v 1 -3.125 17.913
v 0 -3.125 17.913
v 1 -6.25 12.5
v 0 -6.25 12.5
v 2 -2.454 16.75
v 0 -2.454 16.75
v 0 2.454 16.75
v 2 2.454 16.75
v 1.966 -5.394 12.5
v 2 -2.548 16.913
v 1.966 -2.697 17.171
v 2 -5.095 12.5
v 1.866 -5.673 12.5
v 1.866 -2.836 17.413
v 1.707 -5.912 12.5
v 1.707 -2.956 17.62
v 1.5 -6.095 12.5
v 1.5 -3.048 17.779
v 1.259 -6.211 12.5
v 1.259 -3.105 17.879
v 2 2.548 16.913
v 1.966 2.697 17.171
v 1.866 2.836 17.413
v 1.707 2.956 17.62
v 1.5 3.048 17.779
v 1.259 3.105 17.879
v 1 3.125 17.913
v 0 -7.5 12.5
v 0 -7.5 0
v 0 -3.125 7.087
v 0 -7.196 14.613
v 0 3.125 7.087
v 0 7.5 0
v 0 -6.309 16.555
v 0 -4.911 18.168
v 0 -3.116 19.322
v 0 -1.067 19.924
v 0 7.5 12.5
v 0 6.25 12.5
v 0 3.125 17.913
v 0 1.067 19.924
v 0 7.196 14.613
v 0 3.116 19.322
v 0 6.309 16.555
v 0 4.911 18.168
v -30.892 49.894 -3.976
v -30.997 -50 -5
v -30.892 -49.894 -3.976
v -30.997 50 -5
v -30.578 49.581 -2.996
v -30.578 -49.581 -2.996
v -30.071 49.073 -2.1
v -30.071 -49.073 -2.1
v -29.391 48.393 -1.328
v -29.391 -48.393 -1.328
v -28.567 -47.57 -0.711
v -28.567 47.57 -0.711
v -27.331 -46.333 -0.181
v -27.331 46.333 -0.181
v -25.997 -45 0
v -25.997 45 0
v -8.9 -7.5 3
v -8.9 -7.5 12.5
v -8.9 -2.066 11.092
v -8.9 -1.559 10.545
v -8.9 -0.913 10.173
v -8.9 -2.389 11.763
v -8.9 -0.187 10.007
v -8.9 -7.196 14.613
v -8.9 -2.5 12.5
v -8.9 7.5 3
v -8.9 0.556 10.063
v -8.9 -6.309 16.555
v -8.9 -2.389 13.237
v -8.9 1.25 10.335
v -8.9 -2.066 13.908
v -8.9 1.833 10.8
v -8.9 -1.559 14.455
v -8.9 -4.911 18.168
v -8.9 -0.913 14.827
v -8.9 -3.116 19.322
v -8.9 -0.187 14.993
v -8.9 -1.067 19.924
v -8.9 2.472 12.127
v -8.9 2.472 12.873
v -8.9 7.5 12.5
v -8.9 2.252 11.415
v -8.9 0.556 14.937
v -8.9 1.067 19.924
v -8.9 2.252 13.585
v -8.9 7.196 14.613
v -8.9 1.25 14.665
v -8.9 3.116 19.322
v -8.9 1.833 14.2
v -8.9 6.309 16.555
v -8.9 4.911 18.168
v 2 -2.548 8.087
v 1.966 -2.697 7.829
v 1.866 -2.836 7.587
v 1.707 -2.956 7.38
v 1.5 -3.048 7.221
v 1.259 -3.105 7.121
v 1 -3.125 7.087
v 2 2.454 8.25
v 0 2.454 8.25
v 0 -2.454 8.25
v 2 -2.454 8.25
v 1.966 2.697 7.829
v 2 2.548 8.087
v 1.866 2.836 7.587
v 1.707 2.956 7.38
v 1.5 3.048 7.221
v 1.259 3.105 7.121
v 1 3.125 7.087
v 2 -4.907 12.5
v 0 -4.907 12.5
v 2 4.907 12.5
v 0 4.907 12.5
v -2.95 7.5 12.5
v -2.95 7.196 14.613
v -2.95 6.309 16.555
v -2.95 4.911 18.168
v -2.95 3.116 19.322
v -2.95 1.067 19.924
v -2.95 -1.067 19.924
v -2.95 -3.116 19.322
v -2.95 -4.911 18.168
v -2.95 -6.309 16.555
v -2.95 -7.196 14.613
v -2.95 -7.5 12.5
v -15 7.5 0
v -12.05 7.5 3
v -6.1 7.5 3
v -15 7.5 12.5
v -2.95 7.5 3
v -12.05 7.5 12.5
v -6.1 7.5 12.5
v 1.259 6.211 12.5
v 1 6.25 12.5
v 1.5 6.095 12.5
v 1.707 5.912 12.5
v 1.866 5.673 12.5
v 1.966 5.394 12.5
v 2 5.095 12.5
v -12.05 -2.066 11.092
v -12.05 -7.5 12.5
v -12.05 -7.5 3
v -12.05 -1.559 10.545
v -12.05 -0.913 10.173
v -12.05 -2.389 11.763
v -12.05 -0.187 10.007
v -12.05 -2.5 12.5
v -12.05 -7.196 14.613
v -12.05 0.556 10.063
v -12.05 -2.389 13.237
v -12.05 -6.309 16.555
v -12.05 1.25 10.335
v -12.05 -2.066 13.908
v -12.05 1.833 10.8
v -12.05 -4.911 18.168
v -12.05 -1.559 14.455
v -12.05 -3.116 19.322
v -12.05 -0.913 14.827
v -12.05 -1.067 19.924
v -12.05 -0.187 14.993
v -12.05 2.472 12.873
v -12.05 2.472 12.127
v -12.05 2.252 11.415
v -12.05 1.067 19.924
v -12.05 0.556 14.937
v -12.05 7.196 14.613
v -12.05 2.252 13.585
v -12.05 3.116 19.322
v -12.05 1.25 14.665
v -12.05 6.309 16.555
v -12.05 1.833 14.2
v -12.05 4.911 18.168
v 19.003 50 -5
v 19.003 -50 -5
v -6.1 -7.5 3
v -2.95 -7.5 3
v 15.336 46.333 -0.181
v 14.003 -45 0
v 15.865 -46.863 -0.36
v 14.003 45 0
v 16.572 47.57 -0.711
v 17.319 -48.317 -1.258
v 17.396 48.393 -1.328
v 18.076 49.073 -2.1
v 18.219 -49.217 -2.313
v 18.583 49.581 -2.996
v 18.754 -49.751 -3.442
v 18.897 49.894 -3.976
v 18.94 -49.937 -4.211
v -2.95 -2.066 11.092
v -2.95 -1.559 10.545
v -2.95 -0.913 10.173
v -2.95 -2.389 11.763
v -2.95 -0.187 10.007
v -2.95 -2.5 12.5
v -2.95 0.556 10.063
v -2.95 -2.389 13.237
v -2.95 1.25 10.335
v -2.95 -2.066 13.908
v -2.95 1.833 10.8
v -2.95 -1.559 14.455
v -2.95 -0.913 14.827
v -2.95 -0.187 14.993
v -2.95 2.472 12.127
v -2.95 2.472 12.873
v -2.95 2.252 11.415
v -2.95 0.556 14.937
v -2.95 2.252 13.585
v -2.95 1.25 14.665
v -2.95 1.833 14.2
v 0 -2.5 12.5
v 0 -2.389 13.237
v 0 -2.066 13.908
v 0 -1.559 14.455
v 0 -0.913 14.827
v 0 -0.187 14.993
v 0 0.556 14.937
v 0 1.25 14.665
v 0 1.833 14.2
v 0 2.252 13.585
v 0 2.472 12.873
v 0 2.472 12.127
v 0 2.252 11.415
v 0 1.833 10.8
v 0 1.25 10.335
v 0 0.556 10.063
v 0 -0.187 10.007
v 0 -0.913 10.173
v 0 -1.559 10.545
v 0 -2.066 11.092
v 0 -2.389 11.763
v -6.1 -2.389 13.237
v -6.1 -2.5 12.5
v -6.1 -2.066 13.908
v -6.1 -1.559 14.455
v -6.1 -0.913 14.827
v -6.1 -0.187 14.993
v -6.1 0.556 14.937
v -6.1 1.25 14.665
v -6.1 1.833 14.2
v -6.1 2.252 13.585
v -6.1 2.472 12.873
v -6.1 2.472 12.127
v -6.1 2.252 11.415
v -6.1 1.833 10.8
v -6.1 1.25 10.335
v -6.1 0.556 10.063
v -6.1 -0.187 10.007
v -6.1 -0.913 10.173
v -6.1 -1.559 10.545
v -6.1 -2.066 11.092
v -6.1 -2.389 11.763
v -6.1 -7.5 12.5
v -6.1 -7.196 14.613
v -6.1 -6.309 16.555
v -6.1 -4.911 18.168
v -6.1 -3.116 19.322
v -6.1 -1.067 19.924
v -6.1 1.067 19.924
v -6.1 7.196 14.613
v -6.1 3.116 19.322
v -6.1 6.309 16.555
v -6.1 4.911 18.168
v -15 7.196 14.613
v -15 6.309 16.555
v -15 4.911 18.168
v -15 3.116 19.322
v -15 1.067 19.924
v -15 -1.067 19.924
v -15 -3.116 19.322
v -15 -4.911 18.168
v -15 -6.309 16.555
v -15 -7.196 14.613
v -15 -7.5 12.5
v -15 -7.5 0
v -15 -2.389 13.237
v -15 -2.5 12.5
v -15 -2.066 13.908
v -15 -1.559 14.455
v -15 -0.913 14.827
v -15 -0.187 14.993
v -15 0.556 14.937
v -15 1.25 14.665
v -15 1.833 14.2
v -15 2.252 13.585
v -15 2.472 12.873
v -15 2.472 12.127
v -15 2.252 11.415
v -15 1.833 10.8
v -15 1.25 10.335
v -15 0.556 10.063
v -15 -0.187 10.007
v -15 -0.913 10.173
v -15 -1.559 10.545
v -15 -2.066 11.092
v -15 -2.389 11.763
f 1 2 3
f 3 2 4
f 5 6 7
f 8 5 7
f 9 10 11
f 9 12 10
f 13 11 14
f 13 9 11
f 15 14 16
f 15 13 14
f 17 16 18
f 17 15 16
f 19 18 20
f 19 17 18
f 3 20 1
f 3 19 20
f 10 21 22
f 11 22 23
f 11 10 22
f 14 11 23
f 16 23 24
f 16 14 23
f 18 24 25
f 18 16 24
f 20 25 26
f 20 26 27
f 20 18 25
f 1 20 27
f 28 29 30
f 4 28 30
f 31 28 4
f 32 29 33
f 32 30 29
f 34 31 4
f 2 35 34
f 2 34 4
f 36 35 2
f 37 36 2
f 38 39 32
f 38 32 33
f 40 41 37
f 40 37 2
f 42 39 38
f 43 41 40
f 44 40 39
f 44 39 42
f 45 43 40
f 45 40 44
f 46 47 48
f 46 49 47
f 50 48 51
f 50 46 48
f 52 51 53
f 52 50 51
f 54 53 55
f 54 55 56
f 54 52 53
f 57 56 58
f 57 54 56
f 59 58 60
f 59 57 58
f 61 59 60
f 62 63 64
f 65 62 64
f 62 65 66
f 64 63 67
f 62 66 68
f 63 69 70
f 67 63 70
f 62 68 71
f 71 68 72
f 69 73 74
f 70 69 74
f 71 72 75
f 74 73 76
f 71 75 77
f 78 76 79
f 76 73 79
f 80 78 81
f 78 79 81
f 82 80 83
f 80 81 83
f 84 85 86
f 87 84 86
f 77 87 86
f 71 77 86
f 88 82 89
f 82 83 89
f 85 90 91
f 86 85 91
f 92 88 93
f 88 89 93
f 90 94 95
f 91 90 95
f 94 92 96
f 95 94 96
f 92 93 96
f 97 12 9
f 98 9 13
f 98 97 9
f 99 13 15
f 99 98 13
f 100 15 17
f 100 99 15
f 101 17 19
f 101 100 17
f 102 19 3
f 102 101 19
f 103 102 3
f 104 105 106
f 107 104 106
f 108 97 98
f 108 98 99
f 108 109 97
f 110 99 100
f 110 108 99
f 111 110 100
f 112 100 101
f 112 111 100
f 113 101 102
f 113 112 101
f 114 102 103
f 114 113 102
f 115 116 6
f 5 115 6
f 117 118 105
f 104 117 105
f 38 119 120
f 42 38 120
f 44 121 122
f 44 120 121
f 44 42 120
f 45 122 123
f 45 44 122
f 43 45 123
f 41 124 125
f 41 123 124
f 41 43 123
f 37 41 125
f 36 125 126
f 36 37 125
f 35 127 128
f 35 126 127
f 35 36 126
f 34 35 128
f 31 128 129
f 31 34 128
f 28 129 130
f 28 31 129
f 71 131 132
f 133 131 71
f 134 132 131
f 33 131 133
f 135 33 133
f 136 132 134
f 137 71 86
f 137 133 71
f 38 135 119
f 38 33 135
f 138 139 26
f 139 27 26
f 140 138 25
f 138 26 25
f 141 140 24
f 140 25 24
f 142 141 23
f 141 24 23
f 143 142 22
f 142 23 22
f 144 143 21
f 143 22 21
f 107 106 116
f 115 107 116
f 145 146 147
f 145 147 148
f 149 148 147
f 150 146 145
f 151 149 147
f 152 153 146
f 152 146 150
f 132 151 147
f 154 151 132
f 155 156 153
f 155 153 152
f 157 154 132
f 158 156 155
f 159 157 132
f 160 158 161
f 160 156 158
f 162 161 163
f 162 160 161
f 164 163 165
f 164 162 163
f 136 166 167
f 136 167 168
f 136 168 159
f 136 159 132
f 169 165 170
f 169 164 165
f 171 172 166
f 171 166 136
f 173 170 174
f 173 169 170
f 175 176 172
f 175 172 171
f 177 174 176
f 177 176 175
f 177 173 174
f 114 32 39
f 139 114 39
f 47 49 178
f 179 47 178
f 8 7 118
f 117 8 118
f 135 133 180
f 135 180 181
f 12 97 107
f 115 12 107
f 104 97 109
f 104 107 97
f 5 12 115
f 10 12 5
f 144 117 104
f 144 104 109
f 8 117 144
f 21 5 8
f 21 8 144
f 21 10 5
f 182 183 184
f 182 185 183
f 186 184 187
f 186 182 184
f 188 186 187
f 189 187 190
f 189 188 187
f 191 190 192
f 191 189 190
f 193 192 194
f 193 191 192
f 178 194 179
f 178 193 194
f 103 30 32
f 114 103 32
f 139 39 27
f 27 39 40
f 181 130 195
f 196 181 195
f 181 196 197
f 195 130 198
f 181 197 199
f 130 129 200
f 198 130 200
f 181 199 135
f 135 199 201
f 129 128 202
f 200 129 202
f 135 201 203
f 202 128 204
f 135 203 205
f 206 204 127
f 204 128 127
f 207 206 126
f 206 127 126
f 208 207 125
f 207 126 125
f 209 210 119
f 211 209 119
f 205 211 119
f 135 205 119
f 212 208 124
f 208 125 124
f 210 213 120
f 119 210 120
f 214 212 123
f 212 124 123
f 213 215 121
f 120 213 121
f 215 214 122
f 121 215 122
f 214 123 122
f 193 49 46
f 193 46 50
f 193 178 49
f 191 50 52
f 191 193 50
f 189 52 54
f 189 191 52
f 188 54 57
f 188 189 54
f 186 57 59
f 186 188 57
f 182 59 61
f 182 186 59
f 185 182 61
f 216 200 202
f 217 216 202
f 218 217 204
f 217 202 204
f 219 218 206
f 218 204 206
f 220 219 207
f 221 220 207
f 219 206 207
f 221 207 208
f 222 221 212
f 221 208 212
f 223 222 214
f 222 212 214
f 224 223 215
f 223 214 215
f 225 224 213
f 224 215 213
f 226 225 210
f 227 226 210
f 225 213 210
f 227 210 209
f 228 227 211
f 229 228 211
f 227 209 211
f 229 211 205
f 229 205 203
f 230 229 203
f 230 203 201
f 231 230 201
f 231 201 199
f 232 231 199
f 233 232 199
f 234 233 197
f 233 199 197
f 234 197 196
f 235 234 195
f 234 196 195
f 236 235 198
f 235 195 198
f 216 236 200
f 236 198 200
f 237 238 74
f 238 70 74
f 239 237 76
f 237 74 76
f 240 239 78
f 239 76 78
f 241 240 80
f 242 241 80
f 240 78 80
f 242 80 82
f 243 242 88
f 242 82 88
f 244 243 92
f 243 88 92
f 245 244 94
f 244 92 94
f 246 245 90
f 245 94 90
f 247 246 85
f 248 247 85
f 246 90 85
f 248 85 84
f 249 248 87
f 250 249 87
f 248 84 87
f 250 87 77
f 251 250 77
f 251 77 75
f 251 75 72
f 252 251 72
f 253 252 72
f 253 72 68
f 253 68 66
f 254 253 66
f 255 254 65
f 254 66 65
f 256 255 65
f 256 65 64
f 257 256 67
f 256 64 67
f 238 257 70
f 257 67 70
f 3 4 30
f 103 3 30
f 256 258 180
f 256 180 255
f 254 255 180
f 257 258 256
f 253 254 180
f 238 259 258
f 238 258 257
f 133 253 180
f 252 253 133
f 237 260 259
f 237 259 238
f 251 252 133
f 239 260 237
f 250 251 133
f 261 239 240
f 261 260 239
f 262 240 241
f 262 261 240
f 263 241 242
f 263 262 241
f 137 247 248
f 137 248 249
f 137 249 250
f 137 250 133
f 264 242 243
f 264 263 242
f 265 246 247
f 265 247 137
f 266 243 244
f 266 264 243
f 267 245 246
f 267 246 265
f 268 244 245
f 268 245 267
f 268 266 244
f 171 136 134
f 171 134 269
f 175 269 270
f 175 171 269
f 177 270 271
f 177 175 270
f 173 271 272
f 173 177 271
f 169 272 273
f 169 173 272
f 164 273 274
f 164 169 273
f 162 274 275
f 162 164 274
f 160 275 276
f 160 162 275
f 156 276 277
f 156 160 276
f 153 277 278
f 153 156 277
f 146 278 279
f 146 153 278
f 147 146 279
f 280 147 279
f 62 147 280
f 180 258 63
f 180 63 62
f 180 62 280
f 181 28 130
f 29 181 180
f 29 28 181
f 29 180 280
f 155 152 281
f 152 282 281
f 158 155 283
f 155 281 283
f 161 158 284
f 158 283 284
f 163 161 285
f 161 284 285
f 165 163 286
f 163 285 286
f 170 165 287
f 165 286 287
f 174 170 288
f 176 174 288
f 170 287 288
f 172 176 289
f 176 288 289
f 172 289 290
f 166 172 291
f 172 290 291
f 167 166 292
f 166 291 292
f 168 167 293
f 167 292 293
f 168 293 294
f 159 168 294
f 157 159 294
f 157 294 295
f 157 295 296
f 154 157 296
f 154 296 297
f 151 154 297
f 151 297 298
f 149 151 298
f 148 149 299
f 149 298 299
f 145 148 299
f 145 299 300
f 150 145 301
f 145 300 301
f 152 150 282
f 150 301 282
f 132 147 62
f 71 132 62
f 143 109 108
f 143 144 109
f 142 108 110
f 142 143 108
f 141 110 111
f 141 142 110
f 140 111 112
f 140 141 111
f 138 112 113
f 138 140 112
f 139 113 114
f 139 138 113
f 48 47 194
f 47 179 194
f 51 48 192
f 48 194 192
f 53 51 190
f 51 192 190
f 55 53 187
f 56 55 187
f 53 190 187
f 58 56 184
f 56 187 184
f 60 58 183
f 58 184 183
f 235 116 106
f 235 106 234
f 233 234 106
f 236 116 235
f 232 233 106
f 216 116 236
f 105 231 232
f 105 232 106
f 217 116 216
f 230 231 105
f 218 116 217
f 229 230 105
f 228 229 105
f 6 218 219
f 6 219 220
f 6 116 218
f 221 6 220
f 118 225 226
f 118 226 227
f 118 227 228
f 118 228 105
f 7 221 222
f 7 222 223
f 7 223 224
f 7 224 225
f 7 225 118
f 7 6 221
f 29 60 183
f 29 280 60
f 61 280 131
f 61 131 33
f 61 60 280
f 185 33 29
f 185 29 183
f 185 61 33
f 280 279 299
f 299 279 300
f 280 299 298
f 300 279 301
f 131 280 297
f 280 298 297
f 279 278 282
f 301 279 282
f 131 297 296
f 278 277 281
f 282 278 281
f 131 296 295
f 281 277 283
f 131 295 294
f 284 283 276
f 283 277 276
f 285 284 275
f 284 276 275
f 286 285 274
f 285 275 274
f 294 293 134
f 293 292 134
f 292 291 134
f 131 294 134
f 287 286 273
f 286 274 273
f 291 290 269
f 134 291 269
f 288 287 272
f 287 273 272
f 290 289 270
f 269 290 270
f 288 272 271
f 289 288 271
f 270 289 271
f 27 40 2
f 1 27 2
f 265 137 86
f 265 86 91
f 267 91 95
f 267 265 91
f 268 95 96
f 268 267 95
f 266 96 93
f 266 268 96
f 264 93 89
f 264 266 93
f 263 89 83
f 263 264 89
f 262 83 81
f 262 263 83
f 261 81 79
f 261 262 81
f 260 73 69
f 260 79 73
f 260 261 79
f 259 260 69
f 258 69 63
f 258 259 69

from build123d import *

# Parameters (mm, degrees)
F0_W      = 15
F0_H      = 3
F1_DEPTH  = 15
F2_DEPTH  = 3
F3_DEPTH  = 3
F4_DEPTH  = 2
F5_DEPTH  = 3
F6_DEPTH  = 12
F7_D      = 5
F7_DEPTH  = 15
F7_TIP    = 1.5021515476
F9_W      = 3.15
F9_H      = 15
F10_DEPTH = 17
F11_R     = 1
F12_W     = 50
F12_H     = 100
F13_DEPTH = 5
F14_R     = 4.99999


# Not quite as in the source:
# - a fillet or chamfer is up to 0.001 mm smaller than in the source, because OpenCascade refuses the exact size


with BuildPart() as f1:
    # F0 (on Right) → F1 (new body)
    with BuildSketch(Plane.YZ):
        with Locations((0, 1.5)):
            Rectangle(F0_W, F0_H)
    extrude(amount=-F1_DEPTH)

    # F0 (on Right) → F2 (join)
    with BuildSketch(Plane.YZ):
        with BuildLine():
            Line((-7.5, 12.5), (-7.5, 3))
            Line((-7.5, 3), (7.5, 3))
            Line((7.5, 3), (7.5, 12.5))
            ThreePointArc((7.5, 12.5), (0, 20), (-7.5, 12.5))
        make_face()
        Polygon((-6.25, 12.5), (-3.125, 17.9126587737), (3.125, 17.9126587737), (6.25, 12.5), (3.125, 7.0873412263), (-3.125, 7.0873412263), align=None, mode=Mode.SUBTRACT)
    extrude(amount=-F2_DEPTH)

    # F0 (on Right) → F3 (join)
    with BuildSketch(Plane.YZ):
        Polygon((3.125, 17.9126587737), (-3.125, 17.9126587737), (-6.25, 12.5), (-3.125, 7.0873412263), (3.125, 7.0873412263), (6.25, 12.5), align=None)
        Polygon((-4.9074772881, 12.5), (-2.4537386441, 16.75), (2.4537386441, 16.75), (4.9074772881, 12.5), (2.4537386441, 8.25), (-2.4537386441, 8.25), align=None, mode=Mode.SUBTRACT)
    extrude(amount=-F3_DEPTH)

    # F0 (on Right) → F4 (join)
    with BuildSketch(Plane.YZ):
        Polygon((3.125, 17.9126587737), (-3.125, 17.9126587737), (-6.25, 12.5), (-3.125, 7.0873412263), (3.125, 7.0873412263), (6.25, 12.5), align=None)
        Polygon((-4.9074772881, 12.5), (-2.4537386441, 16.75), (2.4537386441, 16.75), (4.9074772881, 12.5), (2.4537386441, 8.25), (-2.4537386441, 8.25), align=None, mode=Mode.SUBTRACT)
    extrude(amount=F4_DEPTH)

    # F0 (on Right) → F5 (join)
    with BuildSketch(Plane.YZ):
        Polygon((2.4537386441, 16.75), (-2.4537386441, 16.75), (-4.9074772881, 12.5), (-2.4537386441, 8.25), (2.4537386441, 8.25), (4.9074772881, 12.5), align=None)
    extrude(amount=-F5_DEPTH)

    # F6 (add): a face of the model
    f6_faces = [f1.faces().sort_by_distance(p)[0] for p in [
        (-3, 0, 10.7862789639),
    ]]
    extrude(f6_faces, amount=F6_DEPTH)

    # F7
    with Locations(Plane.YZ):
        with Locations((0, 12.5)):
            Hole(F7_D / 2, depth=F7_DEPTH)
            with Locations((0, 0, -(F7_DEPTH + F7_TIP / 2))):  # 118° drill point
                Cone(0, F7_D / 2, F7_TIP, mode=Mode.SUBTRACT)

    # F9 (on offset) → F10 (cut)
    with BuildSketch(Plane.XY.offset(20)):
        with Locations((-10.475, 0)):
            Rectangle(F9_W, F9_H)
        with Locations((-4.525, 0)):
            Rectangle(F9_W, F9_H)
    extrude(amount=-F10_DEPTH, mode=Mode.SUBTRACT)

    # F11
    f11_edges = [f1.edges().sort_by_distance(p)[0] for p in [
        (2, -4.6875, 9.793671),
        (2, 0, 7.087341),
        (2, -4.6875, 15.206329),
        (2, 0, 17.912659),
        (2, 4.6875, 15.206329),
        (2, 4.6875, 9.793671),
    ]]
    fillet(f11_edges, radius=F11_R)

    # F12 (on Top) → F13 (join)
    with BuildSketch(Plane.XY):
        with Locations((-5.9974378107, 0)):
            Rectangle(F12_W, F12_H)
    extrude(amount=-F13_DEPTH)

    # F14 (radius 5 in the source; OpenCascade refuses exactly that, so slightly less here)
    f14_edges = [f1.edges().sort_by_distance(p)[0] for p in [
        (-5.997438, 50, 0),
        (19.002562, 0, 0),
        (-5.997438, -50, 0),
        (-30.997438, 0, 0),
    ]]
    fillet(f14_edges, radius=F14_R)


solid = f1.part
